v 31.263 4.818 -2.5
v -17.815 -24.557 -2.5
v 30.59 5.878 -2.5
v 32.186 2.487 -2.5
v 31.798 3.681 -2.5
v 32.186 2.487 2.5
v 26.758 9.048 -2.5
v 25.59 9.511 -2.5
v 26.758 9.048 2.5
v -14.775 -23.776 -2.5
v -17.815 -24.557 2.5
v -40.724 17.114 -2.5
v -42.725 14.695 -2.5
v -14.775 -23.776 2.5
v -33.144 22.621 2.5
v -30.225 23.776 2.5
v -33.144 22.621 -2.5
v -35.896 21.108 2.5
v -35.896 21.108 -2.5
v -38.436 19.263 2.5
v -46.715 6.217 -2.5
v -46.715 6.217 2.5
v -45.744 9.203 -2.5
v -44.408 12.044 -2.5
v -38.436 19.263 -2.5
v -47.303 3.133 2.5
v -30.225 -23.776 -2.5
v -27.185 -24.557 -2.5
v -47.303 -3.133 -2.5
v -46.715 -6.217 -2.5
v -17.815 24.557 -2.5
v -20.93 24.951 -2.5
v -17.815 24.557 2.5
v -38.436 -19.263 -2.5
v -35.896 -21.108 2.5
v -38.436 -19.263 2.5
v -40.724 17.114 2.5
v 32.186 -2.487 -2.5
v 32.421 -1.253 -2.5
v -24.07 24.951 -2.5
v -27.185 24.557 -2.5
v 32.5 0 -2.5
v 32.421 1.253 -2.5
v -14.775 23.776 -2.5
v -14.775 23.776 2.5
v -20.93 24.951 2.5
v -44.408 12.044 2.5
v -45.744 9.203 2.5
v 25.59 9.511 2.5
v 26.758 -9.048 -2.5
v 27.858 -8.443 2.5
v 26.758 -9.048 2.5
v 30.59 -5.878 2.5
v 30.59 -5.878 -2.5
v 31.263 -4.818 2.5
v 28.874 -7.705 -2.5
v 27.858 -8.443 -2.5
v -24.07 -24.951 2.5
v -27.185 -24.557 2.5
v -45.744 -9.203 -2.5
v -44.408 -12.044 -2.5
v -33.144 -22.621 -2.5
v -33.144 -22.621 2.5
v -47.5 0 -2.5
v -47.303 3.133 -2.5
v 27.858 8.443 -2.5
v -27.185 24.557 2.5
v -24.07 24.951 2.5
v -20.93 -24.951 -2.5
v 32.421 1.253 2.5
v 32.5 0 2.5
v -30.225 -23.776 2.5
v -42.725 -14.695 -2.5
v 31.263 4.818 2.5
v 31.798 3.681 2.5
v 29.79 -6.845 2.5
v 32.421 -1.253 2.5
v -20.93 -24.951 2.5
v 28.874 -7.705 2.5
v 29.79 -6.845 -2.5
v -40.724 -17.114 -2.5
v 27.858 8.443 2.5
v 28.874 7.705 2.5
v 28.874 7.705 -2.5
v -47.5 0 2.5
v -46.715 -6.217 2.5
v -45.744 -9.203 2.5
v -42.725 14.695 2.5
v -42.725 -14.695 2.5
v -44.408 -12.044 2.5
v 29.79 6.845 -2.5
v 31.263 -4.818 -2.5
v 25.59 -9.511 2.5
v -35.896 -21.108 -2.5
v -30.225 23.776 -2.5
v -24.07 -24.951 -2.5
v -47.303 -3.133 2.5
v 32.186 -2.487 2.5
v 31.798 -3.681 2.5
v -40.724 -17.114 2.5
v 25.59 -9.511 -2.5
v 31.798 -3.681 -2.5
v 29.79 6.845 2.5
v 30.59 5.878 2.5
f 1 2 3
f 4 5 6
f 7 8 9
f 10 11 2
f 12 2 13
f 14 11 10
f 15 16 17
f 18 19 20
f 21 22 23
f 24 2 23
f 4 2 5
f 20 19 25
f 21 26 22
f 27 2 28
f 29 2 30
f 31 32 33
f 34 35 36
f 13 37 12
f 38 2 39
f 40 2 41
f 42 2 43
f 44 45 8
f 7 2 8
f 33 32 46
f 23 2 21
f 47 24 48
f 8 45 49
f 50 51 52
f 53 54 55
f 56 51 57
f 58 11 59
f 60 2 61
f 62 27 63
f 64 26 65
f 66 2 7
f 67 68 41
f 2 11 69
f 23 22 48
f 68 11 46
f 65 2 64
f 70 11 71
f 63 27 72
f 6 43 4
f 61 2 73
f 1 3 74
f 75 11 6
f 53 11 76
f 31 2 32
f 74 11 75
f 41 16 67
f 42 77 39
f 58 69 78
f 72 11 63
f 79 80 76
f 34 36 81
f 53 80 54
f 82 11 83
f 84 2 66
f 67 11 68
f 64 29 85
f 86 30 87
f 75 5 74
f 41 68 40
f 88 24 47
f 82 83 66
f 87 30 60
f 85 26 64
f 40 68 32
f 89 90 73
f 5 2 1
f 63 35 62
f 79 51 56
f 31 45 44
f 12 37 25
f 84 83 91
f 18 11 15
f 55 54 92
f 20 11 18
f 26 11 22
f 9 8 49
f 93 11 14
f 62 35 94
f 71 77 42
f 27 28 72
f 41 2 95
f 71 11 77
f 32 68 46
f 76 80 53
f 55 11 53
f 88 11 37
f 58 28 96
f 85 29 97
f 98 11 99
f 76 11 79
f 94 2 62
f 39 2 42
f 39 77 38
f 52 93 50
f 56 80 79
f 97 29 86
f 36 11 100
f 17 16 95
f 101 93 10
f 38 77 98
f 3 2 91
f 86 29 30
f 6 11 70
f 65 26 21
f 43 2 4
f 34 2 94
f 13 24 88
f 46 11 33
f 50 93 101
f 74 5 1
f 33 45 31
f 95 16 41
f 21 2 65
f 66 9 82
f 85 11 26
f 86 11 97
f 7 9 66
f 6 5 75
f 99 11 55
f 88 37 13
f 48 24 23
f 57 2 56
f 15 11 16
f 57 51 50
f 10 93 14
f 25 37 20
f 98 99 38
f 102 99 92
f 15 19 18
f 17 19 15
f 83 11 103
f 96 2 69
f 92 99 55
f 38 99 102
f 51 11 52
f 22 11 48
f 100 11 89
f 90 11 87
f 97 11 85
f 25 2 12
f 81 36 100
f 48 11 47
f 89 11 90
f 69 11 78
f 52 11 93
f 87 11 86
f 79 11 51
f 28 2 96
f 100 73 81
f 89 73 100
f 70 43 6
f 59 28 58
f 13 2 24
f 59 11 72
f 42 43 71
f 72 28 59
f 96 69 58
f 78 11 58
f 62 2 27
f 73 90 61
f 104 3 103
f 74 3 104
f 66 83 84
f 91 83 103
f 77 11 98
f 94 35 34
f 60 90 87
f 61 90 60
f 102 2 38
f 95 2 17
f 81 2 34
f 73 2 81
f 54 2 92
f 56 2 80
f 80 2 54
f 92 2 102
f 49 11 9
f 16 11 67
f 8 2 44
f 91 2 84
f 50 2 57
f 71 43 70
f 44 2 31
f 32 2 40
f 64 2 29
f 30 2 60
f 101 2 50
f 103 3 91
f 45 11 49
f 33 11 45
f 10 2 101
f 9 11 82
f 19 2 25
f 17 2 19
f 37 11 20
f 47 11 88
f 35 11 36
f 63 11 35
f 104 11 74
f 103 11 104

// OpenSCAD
//-- Parámetros de la pieza
r1=25;
r2=10;
th=5;

//-- Distancia entre los centros de los cilindros
d=r1+r2+10;

//-- Objeto convexo mínimo que contiene los dos cilindros
hull(){
    
    //-- Cilindro 1
    translate([-d/2,0,0])
        cylinder(r=r1,h=th,center=true,$fn=50);

    //-- Cilindro 2
    translate([d/2,0,0])
        cylinder(r=r2,h=th,center=true,$fn=50);

}
